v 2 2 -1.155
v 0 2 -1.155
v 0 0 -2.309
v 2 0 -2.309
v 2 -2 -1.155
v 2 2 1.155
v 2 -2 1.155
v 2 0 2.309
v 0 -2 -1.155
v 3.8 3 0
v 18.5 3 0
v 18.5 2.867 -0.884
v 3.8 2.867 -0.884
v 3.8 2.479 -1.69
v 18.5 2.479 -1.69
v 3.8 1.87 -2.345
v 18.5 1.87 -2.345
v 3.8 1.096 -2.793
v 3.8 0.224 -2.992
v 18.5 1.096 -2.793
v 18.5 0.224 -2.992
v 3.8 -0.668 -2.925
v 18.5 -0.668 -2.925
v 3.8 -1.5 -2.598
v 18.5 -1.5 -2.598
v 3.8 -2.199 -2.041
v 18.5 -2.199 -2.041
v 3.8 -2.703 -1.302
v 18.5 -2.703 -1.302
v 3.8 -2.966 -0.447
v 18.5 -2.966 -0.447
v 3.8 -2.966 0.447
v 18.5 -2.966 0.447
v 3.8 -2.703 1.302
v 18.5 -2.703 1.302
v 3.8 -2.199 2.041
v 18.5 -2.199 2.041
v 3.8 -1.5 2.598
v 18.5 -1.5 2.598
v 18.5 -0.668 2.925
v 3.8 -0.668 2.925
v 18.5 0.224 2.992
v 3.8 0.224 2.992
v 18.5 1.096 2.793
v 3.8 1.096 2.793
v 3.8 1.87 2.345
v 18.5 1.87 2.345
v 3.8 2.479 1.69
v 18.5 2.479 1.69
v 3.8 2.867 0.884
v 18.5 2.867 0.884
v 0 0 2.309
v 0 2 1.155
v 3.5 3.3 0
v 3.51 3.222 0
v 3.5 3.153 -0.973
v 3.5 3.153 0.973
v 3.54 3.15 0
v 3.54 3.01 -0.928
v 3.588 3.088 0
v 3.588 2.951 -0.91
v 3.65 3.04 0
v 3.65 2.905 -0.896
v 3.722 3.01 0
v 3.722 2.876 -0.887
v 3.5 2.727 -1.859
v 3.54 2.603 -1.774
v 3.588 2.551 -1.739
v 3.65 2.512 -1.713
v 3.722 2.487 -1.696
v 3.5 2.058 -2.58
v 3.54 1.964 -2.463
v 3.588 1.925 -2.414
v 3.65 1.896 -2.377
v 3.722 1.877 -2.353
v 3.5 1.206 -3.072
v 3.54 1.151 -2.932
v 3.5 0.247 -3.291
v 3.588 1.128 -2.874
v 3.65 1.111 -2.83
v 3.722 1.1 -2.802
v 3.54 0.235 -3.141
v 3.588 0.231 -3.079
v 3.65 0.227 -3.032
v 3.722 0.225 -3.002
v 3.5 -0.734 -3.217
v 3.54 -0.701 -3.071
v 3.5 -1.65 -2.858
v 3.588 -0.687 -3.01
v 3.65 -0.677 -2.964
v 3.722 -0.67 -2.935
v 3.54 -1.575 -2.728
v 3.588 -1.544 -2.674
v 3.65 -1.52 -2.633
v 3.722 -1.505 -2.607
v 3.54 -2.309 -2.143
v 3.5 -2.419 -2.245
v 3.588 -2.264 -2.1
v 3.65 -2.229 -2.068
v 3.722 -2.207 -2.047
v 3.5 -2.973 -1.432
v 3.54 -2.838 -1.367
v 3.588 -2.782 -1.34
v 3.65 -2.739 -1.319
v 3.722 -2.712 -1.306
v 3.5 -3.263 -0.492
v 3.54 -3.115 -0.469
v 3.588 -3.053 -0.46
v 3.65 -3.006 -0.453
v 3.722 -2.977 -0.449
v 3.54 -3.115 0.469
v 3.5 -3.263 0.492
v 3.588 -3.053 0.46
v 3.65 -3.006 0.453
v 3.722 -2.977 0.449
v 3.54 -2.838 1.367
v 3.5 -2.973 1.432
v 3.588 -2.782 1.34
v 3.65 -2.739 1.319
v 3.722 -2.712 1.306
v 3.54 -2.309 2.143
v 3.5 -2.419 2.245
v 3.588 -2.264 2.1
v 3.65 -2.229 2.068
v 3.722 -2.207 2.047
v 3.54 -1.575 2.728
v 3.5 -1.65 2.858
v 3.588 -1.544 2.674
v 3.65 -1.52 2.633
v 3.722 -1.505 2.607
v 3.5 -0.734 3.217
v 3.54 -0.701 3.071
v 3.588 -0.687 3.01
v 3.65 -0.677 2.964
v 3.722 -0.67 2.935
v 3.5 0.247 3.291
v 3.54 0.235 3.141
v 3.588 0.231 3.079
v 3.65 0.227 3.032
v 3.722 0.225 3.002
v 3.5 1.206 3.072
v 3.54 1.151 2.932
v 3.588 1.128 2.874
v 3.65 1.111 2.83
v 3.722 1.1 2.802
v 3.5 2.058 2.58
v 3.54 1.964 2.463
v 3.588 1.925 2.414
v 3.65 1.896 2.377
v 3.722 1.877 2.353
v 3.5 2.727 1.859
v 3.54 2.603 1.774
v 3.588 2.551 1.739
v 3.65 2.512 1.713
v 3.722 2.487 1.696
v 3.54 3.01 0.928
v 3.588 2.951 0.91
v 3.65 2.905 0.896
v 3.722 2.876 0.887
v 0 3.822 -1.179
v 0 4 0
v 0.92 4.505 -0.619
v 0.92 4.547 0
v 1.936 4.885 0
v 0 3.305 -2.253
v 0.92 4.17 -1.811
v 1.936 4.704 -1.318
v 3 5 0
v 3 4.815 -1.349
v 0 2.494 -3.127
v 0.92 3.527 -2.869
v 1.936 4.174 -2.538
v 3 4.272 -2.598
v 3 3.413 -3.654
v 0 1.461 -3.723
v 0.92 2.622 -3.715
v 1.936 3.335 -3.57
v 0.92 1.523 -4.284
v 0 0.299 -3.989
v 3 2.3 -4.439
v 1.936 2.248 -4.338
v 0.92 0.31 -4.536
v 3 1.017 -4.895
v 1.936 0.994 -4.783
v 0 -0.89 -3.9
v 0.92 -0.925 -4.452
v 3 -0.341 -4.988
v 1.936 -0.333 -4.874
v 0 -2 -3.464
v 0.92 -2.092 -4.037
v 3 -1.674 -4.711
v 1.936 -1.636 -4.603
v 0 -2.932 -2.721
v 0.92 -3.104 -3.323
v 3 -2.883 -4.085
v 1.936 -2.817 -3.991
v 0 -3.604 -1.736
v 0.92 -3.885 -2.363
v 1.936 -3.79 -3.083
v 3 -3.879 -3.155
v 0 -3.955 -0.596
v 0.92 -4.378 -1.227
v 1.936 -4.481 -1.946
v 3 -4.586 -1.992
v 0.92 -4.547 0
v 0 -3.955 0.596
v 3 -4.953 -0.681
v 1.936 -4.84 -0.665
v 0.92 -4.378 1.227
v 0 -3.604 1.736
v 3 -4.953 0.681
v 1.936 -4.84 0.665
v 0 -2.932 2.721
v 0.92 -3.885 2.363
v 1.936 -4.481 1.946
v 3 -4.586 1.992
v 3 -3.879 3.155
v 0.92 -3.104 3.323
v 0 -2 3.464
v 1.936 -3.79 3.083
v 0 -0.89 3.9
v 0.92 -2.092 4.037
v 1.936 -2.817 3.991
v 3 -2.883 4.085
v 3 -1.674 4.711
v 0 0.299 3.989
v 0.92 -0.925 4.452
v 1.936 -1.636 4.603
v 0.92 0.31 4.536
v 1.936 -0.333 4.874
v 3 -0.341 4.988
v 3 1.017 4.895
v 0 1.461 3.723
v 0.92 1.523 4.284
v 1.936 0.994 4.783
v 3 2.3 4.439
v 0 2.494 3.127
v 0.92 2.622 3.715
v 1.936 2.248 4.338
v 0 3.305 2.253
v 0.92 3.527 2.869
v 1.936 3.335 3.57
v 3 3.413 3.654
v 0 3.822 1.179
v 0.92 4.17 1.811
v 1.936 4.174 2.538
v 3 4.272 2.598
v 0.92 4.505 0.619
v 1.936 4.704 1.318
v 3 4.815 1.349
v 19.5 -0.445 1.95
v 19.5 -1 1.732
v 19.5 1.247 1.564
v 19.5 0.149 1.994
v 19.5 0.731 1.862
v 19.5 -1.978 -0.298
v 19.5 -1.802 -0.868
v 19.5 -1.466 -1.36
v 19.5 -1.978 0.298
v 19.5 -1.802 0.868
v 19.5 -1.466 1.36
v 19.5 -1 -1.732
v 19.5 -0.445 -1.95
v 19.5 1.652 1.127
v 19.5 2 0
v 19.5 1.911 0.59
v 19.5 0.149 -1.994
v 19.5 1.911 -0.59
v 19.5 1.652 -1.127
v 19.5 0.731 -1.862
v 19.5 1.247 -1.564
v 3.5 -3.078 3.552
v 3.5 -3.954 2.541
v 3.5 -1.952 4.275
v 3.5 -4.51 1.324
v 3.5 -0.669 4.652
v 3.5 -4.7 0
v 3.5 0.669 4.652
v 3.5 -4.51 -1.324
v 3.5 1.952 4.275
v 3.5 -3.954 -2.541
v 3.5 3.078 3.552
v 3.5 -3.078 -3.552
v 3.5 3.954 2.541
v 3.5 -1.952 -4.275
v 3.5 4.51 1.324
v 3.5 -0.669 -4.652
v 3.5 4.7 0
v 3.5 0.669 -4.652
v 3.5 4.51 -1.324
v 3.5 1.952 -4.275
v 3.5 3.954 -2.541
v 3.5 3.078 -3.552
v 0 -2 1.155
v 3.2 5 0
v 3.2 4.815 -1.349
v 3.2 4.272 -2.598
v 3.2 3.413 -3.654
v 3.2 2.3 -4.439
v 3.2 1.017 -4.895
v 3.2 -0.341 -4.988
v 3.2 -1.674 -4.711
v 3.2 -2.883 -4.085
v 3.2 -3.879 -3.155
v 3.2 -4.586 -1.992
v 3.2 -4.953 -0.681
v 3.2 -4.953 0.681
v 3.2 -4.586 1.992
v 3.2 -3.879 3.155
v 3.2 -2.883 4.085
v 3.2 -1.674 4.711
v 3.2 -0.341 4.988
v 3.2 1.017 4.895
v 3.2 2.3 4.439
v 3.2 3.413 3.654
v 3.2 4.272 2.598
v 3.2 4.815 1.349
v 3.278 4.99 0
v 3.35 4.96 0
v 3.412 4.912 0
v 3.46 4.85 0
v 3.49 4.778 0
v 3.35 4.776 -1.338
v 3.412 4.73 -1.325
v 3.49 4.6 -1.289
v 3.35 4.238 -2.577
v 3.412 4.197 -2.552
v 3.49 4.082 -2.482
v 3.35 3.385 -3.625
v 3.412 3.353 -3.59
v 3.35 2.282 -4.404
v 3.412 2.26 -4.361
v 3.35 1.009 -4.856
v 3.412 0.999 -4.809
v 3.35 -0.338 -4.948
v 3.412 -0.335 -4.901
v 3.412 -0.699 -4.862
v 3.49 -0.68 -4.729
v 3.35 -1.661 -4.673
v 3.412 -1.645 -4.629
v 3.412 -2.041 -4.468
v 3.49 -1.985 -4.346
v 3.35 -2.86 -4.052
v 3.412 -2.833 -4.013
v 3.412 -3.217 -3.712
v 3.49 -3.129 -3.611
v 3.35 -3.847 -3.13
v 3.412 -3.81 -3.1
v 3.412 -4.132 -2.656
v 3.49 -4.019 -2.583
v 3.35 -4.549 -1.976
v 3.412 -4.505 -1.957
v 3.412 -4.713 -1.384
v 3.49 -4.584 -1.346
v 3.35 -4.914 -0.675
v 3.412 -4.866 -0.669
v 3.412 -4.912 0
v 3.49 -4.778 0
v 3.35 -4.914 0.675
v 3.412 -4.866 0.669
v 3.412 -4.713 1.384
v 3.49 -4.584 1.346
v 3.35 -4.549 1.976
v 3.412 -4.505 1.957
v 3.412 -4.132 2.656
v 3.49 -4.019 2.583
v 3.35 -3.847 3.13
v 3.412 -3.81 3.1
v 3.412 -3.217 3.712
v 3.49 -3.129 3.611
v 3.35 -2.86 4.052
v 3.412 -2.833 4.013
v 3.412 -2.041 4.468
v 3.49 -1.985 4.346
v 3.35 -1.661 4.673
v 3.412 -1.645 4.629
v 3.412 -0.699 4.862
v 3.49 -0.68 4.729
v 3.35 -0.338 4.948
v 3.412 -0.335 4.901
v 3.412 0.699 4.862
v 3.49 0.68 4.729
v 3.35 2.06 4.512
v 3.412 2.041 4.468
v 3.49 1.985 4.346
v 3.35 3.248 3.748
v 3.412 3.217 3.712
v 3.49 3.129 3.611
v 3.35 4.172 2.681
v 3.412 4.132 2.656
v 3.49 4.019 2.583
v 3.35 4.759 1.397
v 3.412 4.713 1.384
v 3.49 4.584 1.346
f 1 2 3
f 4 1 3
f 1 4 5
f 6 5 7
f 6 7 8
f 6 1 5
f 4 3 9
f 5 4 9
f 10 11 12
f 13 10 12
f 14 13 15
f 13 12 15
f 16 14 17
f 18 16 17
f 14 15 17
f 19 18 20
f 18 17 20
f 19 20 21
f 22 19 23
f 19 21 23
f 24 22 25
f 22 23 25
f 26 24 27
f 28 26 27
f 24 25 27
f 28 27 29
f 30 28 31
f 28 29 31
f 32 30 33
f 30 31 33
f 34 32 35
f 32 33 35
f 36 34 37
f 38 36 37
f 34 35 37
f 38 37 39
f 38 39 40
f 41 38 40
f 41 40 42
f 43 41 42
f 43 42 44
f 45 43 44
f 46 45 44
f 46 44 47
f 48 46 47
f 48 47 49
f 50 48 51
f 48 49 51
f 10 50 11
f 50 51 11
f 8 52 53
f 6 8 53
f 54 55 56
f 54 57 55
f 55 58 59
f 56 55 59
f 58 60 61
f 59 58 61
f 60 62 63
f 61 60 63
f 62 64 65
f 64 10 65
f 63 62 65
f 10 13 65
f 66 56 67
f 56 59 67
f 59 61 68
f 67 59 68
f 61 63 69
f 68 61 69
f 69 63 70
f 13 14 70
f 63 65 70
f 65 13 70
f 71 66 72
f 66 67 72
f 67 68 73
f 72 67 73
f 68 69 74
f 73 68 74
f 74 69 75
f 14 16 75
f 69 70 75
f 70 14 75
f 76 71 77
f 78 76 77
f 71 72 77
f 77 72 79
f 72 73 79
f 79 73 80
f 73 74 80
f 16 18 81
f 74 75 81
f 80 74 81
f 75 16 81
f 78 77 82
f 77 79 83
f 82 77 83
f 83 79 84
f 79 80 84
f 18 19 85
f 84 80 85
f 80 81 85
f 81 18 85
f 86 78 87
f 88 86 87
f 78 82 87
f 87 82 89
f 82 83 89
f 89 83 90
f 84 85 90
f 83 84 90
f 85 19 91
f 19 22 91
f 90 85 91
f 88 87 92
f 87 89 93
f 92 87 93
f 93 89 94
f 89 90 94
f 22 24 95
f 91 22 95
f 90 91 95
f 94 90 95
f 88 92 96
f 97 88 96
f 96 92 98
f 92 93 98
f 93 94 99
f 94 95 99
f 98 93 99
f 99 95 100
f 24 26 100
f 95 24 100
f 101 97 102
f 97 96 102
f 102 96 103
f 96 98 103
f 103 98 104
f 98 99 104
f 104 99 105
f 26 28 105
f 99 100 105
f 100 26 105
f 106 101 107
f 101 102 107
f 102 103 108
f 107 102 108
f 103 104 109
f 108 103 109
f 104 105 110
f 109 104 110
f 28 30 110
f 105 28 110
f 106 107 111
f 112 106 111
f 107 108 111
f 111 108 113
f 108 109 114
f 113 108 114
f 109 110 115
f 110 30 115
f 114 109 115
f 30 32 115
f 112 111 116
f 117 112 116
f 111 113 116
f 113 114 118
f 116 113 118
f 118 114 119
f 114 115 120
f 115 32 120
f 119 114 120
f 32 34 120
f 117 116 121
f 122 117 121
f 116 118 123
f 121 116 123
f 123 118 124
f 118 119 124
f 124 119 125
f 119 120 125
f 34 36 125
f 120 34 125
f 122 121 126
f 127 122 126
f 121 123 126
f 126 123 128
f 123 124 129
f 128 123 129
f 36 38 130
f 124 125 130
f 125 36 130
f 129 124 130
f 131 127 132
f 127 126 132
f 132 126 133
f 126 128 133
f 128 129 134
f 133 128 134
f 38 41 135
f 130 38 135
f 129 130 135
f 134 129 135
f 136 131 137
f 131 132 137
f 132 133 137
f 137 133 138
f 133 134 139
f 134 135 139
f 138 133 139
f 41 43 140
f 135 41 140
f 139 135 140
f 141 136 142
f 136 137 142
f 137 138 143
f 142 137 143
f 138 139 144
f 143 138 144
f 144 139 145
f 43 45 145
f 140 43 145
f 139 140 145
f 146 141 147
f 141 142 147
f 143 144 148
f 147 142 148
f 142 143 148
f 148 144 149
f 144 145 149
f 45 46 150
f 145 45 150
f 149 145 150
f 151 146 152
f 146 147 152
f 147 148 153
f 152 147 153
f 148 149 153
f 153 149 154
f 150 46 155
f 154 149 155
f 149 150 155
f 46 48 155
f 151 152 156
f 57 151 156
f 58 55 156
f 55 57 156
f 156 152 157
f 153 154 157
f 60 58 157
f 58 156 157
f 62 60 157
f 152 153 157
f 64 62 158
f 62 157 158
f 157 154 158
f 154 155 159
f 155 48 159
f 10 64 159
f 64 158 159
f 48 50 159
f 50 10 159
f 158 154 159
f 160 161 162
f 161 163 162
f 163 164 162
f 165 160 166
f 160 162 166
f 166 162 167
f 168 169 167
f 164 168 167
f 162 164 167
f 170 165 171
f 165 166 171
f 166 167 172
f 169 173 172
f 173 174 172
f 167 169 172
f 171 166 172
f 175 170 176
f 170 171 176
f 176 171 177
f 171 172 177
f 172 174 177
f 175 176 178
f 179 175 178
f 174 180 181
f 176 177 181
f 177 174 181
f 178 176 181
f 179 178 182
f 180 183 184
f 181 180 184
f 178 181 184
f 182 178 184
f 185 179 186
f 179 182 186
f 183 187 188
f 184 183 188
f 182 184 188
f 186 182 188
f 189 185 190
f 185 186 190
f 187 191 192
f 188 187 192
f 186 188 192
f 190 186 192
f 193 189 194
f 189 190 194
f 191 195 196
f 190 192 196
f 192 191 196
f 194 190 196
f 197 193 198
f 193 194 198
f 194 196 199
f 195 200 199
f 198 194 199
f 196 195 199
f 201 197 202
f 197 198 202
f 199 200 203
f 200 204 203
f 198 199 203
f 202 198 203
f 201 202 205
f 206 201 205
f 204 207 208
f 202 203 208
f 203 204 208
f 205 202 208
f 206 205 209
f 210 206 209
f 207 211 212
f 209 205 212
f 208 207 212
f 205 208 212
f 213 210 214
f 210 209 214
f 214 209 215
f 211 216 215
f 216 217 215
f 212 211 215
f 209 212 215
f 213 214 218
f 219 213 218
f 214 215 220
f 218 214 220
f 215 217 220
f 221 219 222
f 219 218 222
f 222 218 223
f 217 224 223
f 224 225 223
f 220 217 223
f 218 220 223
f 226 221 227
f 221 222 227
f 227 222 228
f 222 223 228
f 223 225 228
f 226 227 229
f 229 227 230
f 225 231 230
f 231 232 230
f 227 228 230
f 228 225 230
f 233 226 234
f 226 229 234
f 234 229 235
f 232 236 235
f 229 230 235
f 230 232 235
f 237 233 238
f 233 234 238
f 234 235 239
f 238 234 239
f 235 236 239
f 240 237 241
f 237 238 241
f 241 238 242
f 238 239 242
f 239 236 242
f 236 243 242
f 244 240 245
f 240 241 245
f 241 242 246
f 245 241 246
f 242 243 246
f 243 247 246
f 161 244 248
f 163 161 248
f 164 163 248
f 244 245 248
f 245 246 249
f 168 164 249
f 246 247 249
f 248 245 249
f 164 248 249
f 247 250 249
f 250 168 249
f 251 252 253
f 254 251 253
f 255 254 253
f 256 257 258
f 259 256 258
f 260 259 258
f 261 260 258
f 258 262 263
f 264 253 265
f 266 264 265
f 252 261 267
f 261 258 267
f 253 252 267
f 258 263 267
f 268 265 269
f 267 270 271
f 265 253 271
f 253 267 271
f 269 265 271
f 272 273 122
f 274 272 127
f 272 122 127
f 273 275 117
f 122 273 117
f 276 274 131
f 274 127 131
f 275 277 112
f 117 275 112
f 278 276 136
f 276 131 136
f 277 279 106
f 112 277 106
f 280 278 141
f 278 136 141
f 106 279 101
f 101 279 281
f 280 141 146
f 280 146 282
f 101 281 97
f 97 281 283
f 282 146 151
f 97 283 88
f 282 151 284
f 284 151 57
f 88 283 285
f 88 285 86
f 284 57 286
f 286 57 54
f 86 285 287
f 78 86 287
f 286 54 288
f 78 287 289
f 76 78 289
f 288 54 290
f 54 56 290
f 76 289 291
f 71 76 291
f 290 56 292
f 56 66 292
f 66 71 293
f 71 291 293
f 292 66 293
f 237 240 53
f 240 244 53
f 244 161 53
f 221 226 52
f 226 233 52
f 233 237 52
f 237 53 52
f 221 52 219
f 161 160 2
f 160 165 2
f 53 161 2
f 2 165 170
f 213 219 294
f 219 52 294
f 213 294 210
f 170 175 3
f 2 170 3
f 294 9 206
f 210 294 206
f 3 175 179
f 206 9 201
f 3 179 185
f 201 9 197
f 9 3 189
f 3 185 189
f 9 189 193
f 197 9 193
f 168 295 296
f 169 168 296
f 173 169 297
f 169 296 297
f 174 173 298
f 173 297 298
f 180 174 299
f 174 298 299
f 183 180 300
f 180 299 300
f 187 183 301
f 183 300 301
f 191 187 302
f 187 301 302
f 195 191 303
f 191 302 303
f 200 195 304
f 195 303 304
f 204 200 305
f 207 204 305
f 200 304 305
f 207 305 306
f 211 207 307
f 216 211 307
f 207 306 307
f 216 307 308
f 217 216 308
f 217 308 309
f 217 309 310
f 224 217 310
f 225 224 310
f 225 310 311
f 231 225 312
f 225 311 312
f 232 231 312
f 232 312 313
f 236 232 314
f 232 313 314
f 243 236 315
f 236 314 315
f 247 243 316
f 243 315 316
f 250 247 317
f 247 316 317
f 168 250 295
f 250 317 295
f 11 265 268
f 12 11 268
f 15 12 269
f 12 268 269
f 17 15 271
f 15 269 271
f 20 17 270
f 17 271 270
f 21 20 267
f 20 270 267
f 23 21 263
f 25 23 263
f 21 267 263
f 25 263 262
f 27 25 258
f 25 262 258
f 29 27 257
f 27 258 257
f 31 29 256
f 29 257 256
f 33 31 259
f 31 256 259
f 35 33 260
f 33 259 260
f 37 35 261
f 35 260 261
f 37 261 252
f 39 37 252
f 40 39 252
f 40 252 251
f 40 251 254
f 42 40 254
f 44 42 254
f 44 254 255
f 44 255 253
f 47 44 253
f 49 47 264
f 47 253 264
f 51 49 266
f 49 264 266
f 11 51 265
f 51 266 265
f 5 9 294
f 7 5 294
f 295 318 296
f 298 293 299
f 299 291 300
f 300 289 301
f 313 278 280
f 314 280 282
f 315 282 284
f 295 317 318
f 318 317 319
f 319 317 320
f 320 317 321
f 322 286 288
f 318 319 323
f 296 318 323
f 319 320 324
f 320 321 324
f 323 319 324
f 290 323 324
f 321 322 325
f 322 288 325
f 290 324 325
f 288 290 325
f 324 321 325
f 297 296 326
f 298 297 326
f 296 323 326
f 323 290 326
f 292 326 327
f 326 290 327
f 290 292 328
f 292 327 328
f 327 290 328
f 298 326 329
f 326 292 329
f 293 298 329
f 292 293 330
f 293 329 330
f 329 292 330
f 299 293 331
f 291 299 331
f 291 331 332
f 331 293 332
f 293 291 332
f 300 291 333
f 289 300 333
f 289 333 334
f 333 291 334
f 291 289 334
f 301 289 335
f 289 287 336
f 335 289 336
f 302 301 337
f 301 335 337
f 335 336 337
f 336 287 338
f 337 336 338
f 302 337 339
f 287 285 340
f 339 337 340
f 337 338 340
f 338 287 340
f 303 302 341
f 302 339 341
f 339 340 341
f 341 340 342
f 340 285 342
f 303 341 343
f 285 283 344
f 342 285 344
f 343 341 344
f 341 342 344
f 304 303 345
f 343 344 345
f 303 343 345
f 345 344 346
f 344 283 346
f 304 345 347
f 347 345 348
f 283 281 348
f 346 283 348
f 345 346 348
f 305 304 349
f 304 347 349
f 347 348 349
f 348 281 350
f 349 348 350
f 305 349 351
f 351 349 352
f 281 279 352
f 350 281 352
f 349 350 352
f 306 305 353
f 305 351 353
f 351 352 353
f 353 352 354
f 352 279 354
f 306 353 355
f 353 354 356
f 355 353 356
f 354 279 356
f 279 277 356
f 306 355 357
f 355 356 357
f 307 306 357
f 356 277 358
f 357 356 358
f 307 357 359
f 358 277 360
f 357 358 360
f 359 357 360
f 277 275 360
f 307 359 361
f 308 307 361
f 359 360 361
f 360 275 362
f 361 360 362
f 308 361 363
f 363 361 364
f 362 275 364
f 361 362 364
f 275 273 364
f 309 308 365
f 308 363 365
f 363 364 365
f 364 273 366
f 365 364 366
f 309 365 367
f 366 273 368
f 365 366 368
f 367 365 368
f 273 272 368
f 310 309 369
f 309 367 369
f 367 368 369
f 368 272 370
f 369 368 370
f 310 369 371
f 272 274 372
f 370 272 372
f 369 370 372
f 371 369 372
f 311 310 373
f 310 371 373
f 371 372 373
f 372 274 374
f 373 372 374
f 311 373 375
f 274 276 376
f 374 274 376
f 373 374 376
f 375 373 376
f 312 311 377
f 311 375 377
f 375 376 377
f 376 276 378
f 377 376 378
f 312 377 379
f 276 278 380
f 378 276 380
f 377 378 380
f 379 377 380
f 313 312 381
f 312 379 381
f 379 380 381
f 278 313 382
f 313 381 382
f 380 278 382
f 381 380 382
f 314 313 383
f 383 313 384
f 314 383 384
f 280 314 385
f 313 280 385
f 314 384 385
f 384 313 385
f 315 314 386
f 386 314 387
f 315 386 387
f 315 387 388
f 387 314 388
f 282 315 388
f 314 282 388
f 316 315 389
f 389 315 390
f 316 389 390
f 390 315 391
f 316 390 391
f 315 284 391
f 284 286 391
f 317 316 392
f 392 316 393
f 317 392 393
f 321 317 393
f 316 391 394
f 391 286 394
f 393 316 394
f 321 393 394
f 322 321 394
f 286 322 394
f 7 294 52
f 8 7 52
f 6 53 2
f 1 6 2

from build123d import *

# Parameters (mm, degrees)
CUT_EXTRUDE_1_DEPTH = 2
FILLET_1_R          = 0.3
CHAMFER_1_SIZE      = 1


with BuildPart() as part:
    # Эскиз1 → Повернуть1 (revolve)
    with BuildSketch(Plane.XY):
        with BuildLine():
            Line((0, 0), (0, 4))
            ThreePointArc((0, 4), (1.41886117, 4.74341649), (3, 5))
            Line((3, 5), (3.5, 5))
            Line((3.5, 5), (3.5, 3))
            Line((3.5, 3), (19.5, 3))
            Line((19.5, 3), (19.5, 0))
            Line((19.5, 0), (0, 0))
        make_face()
    revolve(axis=Axis((19.5, 0, 0), (-1, 0, 0)))

    # Эскиз2 → Вырез-Вытянуть1 (cut)
    with BuildSketch(Plane.ZY):
        Polygon((1.154700538, 2), (-1.154700538, 2), (-2.309401077, 0), (-1.154700538, -2), (1.154700538, -2), (2.309401077, 0), align=None)
    extrude(amount=-CUT_EXTRUDE_1_DEPTH, mode=Mode.SUBTRACT)

    # Скругление1
    fillet_1_edges = [part.edges().sort_by_distance(p)[0] for p in [
        (3.5, -3, 0),
        (3.5, -5, 0),
    ]]
    fillet(fillet_1_edges, radius=FILLET_1_R)

    # Фаска1
    chamfer_1_edges = [part.edges().sort_by_distance(p)[0] for p in [
        (19.5, -3, 0),
    ]]
    chamfer(chamfer_1_edges, length=CHAMFER_1_SIZE)


solid = part.part
